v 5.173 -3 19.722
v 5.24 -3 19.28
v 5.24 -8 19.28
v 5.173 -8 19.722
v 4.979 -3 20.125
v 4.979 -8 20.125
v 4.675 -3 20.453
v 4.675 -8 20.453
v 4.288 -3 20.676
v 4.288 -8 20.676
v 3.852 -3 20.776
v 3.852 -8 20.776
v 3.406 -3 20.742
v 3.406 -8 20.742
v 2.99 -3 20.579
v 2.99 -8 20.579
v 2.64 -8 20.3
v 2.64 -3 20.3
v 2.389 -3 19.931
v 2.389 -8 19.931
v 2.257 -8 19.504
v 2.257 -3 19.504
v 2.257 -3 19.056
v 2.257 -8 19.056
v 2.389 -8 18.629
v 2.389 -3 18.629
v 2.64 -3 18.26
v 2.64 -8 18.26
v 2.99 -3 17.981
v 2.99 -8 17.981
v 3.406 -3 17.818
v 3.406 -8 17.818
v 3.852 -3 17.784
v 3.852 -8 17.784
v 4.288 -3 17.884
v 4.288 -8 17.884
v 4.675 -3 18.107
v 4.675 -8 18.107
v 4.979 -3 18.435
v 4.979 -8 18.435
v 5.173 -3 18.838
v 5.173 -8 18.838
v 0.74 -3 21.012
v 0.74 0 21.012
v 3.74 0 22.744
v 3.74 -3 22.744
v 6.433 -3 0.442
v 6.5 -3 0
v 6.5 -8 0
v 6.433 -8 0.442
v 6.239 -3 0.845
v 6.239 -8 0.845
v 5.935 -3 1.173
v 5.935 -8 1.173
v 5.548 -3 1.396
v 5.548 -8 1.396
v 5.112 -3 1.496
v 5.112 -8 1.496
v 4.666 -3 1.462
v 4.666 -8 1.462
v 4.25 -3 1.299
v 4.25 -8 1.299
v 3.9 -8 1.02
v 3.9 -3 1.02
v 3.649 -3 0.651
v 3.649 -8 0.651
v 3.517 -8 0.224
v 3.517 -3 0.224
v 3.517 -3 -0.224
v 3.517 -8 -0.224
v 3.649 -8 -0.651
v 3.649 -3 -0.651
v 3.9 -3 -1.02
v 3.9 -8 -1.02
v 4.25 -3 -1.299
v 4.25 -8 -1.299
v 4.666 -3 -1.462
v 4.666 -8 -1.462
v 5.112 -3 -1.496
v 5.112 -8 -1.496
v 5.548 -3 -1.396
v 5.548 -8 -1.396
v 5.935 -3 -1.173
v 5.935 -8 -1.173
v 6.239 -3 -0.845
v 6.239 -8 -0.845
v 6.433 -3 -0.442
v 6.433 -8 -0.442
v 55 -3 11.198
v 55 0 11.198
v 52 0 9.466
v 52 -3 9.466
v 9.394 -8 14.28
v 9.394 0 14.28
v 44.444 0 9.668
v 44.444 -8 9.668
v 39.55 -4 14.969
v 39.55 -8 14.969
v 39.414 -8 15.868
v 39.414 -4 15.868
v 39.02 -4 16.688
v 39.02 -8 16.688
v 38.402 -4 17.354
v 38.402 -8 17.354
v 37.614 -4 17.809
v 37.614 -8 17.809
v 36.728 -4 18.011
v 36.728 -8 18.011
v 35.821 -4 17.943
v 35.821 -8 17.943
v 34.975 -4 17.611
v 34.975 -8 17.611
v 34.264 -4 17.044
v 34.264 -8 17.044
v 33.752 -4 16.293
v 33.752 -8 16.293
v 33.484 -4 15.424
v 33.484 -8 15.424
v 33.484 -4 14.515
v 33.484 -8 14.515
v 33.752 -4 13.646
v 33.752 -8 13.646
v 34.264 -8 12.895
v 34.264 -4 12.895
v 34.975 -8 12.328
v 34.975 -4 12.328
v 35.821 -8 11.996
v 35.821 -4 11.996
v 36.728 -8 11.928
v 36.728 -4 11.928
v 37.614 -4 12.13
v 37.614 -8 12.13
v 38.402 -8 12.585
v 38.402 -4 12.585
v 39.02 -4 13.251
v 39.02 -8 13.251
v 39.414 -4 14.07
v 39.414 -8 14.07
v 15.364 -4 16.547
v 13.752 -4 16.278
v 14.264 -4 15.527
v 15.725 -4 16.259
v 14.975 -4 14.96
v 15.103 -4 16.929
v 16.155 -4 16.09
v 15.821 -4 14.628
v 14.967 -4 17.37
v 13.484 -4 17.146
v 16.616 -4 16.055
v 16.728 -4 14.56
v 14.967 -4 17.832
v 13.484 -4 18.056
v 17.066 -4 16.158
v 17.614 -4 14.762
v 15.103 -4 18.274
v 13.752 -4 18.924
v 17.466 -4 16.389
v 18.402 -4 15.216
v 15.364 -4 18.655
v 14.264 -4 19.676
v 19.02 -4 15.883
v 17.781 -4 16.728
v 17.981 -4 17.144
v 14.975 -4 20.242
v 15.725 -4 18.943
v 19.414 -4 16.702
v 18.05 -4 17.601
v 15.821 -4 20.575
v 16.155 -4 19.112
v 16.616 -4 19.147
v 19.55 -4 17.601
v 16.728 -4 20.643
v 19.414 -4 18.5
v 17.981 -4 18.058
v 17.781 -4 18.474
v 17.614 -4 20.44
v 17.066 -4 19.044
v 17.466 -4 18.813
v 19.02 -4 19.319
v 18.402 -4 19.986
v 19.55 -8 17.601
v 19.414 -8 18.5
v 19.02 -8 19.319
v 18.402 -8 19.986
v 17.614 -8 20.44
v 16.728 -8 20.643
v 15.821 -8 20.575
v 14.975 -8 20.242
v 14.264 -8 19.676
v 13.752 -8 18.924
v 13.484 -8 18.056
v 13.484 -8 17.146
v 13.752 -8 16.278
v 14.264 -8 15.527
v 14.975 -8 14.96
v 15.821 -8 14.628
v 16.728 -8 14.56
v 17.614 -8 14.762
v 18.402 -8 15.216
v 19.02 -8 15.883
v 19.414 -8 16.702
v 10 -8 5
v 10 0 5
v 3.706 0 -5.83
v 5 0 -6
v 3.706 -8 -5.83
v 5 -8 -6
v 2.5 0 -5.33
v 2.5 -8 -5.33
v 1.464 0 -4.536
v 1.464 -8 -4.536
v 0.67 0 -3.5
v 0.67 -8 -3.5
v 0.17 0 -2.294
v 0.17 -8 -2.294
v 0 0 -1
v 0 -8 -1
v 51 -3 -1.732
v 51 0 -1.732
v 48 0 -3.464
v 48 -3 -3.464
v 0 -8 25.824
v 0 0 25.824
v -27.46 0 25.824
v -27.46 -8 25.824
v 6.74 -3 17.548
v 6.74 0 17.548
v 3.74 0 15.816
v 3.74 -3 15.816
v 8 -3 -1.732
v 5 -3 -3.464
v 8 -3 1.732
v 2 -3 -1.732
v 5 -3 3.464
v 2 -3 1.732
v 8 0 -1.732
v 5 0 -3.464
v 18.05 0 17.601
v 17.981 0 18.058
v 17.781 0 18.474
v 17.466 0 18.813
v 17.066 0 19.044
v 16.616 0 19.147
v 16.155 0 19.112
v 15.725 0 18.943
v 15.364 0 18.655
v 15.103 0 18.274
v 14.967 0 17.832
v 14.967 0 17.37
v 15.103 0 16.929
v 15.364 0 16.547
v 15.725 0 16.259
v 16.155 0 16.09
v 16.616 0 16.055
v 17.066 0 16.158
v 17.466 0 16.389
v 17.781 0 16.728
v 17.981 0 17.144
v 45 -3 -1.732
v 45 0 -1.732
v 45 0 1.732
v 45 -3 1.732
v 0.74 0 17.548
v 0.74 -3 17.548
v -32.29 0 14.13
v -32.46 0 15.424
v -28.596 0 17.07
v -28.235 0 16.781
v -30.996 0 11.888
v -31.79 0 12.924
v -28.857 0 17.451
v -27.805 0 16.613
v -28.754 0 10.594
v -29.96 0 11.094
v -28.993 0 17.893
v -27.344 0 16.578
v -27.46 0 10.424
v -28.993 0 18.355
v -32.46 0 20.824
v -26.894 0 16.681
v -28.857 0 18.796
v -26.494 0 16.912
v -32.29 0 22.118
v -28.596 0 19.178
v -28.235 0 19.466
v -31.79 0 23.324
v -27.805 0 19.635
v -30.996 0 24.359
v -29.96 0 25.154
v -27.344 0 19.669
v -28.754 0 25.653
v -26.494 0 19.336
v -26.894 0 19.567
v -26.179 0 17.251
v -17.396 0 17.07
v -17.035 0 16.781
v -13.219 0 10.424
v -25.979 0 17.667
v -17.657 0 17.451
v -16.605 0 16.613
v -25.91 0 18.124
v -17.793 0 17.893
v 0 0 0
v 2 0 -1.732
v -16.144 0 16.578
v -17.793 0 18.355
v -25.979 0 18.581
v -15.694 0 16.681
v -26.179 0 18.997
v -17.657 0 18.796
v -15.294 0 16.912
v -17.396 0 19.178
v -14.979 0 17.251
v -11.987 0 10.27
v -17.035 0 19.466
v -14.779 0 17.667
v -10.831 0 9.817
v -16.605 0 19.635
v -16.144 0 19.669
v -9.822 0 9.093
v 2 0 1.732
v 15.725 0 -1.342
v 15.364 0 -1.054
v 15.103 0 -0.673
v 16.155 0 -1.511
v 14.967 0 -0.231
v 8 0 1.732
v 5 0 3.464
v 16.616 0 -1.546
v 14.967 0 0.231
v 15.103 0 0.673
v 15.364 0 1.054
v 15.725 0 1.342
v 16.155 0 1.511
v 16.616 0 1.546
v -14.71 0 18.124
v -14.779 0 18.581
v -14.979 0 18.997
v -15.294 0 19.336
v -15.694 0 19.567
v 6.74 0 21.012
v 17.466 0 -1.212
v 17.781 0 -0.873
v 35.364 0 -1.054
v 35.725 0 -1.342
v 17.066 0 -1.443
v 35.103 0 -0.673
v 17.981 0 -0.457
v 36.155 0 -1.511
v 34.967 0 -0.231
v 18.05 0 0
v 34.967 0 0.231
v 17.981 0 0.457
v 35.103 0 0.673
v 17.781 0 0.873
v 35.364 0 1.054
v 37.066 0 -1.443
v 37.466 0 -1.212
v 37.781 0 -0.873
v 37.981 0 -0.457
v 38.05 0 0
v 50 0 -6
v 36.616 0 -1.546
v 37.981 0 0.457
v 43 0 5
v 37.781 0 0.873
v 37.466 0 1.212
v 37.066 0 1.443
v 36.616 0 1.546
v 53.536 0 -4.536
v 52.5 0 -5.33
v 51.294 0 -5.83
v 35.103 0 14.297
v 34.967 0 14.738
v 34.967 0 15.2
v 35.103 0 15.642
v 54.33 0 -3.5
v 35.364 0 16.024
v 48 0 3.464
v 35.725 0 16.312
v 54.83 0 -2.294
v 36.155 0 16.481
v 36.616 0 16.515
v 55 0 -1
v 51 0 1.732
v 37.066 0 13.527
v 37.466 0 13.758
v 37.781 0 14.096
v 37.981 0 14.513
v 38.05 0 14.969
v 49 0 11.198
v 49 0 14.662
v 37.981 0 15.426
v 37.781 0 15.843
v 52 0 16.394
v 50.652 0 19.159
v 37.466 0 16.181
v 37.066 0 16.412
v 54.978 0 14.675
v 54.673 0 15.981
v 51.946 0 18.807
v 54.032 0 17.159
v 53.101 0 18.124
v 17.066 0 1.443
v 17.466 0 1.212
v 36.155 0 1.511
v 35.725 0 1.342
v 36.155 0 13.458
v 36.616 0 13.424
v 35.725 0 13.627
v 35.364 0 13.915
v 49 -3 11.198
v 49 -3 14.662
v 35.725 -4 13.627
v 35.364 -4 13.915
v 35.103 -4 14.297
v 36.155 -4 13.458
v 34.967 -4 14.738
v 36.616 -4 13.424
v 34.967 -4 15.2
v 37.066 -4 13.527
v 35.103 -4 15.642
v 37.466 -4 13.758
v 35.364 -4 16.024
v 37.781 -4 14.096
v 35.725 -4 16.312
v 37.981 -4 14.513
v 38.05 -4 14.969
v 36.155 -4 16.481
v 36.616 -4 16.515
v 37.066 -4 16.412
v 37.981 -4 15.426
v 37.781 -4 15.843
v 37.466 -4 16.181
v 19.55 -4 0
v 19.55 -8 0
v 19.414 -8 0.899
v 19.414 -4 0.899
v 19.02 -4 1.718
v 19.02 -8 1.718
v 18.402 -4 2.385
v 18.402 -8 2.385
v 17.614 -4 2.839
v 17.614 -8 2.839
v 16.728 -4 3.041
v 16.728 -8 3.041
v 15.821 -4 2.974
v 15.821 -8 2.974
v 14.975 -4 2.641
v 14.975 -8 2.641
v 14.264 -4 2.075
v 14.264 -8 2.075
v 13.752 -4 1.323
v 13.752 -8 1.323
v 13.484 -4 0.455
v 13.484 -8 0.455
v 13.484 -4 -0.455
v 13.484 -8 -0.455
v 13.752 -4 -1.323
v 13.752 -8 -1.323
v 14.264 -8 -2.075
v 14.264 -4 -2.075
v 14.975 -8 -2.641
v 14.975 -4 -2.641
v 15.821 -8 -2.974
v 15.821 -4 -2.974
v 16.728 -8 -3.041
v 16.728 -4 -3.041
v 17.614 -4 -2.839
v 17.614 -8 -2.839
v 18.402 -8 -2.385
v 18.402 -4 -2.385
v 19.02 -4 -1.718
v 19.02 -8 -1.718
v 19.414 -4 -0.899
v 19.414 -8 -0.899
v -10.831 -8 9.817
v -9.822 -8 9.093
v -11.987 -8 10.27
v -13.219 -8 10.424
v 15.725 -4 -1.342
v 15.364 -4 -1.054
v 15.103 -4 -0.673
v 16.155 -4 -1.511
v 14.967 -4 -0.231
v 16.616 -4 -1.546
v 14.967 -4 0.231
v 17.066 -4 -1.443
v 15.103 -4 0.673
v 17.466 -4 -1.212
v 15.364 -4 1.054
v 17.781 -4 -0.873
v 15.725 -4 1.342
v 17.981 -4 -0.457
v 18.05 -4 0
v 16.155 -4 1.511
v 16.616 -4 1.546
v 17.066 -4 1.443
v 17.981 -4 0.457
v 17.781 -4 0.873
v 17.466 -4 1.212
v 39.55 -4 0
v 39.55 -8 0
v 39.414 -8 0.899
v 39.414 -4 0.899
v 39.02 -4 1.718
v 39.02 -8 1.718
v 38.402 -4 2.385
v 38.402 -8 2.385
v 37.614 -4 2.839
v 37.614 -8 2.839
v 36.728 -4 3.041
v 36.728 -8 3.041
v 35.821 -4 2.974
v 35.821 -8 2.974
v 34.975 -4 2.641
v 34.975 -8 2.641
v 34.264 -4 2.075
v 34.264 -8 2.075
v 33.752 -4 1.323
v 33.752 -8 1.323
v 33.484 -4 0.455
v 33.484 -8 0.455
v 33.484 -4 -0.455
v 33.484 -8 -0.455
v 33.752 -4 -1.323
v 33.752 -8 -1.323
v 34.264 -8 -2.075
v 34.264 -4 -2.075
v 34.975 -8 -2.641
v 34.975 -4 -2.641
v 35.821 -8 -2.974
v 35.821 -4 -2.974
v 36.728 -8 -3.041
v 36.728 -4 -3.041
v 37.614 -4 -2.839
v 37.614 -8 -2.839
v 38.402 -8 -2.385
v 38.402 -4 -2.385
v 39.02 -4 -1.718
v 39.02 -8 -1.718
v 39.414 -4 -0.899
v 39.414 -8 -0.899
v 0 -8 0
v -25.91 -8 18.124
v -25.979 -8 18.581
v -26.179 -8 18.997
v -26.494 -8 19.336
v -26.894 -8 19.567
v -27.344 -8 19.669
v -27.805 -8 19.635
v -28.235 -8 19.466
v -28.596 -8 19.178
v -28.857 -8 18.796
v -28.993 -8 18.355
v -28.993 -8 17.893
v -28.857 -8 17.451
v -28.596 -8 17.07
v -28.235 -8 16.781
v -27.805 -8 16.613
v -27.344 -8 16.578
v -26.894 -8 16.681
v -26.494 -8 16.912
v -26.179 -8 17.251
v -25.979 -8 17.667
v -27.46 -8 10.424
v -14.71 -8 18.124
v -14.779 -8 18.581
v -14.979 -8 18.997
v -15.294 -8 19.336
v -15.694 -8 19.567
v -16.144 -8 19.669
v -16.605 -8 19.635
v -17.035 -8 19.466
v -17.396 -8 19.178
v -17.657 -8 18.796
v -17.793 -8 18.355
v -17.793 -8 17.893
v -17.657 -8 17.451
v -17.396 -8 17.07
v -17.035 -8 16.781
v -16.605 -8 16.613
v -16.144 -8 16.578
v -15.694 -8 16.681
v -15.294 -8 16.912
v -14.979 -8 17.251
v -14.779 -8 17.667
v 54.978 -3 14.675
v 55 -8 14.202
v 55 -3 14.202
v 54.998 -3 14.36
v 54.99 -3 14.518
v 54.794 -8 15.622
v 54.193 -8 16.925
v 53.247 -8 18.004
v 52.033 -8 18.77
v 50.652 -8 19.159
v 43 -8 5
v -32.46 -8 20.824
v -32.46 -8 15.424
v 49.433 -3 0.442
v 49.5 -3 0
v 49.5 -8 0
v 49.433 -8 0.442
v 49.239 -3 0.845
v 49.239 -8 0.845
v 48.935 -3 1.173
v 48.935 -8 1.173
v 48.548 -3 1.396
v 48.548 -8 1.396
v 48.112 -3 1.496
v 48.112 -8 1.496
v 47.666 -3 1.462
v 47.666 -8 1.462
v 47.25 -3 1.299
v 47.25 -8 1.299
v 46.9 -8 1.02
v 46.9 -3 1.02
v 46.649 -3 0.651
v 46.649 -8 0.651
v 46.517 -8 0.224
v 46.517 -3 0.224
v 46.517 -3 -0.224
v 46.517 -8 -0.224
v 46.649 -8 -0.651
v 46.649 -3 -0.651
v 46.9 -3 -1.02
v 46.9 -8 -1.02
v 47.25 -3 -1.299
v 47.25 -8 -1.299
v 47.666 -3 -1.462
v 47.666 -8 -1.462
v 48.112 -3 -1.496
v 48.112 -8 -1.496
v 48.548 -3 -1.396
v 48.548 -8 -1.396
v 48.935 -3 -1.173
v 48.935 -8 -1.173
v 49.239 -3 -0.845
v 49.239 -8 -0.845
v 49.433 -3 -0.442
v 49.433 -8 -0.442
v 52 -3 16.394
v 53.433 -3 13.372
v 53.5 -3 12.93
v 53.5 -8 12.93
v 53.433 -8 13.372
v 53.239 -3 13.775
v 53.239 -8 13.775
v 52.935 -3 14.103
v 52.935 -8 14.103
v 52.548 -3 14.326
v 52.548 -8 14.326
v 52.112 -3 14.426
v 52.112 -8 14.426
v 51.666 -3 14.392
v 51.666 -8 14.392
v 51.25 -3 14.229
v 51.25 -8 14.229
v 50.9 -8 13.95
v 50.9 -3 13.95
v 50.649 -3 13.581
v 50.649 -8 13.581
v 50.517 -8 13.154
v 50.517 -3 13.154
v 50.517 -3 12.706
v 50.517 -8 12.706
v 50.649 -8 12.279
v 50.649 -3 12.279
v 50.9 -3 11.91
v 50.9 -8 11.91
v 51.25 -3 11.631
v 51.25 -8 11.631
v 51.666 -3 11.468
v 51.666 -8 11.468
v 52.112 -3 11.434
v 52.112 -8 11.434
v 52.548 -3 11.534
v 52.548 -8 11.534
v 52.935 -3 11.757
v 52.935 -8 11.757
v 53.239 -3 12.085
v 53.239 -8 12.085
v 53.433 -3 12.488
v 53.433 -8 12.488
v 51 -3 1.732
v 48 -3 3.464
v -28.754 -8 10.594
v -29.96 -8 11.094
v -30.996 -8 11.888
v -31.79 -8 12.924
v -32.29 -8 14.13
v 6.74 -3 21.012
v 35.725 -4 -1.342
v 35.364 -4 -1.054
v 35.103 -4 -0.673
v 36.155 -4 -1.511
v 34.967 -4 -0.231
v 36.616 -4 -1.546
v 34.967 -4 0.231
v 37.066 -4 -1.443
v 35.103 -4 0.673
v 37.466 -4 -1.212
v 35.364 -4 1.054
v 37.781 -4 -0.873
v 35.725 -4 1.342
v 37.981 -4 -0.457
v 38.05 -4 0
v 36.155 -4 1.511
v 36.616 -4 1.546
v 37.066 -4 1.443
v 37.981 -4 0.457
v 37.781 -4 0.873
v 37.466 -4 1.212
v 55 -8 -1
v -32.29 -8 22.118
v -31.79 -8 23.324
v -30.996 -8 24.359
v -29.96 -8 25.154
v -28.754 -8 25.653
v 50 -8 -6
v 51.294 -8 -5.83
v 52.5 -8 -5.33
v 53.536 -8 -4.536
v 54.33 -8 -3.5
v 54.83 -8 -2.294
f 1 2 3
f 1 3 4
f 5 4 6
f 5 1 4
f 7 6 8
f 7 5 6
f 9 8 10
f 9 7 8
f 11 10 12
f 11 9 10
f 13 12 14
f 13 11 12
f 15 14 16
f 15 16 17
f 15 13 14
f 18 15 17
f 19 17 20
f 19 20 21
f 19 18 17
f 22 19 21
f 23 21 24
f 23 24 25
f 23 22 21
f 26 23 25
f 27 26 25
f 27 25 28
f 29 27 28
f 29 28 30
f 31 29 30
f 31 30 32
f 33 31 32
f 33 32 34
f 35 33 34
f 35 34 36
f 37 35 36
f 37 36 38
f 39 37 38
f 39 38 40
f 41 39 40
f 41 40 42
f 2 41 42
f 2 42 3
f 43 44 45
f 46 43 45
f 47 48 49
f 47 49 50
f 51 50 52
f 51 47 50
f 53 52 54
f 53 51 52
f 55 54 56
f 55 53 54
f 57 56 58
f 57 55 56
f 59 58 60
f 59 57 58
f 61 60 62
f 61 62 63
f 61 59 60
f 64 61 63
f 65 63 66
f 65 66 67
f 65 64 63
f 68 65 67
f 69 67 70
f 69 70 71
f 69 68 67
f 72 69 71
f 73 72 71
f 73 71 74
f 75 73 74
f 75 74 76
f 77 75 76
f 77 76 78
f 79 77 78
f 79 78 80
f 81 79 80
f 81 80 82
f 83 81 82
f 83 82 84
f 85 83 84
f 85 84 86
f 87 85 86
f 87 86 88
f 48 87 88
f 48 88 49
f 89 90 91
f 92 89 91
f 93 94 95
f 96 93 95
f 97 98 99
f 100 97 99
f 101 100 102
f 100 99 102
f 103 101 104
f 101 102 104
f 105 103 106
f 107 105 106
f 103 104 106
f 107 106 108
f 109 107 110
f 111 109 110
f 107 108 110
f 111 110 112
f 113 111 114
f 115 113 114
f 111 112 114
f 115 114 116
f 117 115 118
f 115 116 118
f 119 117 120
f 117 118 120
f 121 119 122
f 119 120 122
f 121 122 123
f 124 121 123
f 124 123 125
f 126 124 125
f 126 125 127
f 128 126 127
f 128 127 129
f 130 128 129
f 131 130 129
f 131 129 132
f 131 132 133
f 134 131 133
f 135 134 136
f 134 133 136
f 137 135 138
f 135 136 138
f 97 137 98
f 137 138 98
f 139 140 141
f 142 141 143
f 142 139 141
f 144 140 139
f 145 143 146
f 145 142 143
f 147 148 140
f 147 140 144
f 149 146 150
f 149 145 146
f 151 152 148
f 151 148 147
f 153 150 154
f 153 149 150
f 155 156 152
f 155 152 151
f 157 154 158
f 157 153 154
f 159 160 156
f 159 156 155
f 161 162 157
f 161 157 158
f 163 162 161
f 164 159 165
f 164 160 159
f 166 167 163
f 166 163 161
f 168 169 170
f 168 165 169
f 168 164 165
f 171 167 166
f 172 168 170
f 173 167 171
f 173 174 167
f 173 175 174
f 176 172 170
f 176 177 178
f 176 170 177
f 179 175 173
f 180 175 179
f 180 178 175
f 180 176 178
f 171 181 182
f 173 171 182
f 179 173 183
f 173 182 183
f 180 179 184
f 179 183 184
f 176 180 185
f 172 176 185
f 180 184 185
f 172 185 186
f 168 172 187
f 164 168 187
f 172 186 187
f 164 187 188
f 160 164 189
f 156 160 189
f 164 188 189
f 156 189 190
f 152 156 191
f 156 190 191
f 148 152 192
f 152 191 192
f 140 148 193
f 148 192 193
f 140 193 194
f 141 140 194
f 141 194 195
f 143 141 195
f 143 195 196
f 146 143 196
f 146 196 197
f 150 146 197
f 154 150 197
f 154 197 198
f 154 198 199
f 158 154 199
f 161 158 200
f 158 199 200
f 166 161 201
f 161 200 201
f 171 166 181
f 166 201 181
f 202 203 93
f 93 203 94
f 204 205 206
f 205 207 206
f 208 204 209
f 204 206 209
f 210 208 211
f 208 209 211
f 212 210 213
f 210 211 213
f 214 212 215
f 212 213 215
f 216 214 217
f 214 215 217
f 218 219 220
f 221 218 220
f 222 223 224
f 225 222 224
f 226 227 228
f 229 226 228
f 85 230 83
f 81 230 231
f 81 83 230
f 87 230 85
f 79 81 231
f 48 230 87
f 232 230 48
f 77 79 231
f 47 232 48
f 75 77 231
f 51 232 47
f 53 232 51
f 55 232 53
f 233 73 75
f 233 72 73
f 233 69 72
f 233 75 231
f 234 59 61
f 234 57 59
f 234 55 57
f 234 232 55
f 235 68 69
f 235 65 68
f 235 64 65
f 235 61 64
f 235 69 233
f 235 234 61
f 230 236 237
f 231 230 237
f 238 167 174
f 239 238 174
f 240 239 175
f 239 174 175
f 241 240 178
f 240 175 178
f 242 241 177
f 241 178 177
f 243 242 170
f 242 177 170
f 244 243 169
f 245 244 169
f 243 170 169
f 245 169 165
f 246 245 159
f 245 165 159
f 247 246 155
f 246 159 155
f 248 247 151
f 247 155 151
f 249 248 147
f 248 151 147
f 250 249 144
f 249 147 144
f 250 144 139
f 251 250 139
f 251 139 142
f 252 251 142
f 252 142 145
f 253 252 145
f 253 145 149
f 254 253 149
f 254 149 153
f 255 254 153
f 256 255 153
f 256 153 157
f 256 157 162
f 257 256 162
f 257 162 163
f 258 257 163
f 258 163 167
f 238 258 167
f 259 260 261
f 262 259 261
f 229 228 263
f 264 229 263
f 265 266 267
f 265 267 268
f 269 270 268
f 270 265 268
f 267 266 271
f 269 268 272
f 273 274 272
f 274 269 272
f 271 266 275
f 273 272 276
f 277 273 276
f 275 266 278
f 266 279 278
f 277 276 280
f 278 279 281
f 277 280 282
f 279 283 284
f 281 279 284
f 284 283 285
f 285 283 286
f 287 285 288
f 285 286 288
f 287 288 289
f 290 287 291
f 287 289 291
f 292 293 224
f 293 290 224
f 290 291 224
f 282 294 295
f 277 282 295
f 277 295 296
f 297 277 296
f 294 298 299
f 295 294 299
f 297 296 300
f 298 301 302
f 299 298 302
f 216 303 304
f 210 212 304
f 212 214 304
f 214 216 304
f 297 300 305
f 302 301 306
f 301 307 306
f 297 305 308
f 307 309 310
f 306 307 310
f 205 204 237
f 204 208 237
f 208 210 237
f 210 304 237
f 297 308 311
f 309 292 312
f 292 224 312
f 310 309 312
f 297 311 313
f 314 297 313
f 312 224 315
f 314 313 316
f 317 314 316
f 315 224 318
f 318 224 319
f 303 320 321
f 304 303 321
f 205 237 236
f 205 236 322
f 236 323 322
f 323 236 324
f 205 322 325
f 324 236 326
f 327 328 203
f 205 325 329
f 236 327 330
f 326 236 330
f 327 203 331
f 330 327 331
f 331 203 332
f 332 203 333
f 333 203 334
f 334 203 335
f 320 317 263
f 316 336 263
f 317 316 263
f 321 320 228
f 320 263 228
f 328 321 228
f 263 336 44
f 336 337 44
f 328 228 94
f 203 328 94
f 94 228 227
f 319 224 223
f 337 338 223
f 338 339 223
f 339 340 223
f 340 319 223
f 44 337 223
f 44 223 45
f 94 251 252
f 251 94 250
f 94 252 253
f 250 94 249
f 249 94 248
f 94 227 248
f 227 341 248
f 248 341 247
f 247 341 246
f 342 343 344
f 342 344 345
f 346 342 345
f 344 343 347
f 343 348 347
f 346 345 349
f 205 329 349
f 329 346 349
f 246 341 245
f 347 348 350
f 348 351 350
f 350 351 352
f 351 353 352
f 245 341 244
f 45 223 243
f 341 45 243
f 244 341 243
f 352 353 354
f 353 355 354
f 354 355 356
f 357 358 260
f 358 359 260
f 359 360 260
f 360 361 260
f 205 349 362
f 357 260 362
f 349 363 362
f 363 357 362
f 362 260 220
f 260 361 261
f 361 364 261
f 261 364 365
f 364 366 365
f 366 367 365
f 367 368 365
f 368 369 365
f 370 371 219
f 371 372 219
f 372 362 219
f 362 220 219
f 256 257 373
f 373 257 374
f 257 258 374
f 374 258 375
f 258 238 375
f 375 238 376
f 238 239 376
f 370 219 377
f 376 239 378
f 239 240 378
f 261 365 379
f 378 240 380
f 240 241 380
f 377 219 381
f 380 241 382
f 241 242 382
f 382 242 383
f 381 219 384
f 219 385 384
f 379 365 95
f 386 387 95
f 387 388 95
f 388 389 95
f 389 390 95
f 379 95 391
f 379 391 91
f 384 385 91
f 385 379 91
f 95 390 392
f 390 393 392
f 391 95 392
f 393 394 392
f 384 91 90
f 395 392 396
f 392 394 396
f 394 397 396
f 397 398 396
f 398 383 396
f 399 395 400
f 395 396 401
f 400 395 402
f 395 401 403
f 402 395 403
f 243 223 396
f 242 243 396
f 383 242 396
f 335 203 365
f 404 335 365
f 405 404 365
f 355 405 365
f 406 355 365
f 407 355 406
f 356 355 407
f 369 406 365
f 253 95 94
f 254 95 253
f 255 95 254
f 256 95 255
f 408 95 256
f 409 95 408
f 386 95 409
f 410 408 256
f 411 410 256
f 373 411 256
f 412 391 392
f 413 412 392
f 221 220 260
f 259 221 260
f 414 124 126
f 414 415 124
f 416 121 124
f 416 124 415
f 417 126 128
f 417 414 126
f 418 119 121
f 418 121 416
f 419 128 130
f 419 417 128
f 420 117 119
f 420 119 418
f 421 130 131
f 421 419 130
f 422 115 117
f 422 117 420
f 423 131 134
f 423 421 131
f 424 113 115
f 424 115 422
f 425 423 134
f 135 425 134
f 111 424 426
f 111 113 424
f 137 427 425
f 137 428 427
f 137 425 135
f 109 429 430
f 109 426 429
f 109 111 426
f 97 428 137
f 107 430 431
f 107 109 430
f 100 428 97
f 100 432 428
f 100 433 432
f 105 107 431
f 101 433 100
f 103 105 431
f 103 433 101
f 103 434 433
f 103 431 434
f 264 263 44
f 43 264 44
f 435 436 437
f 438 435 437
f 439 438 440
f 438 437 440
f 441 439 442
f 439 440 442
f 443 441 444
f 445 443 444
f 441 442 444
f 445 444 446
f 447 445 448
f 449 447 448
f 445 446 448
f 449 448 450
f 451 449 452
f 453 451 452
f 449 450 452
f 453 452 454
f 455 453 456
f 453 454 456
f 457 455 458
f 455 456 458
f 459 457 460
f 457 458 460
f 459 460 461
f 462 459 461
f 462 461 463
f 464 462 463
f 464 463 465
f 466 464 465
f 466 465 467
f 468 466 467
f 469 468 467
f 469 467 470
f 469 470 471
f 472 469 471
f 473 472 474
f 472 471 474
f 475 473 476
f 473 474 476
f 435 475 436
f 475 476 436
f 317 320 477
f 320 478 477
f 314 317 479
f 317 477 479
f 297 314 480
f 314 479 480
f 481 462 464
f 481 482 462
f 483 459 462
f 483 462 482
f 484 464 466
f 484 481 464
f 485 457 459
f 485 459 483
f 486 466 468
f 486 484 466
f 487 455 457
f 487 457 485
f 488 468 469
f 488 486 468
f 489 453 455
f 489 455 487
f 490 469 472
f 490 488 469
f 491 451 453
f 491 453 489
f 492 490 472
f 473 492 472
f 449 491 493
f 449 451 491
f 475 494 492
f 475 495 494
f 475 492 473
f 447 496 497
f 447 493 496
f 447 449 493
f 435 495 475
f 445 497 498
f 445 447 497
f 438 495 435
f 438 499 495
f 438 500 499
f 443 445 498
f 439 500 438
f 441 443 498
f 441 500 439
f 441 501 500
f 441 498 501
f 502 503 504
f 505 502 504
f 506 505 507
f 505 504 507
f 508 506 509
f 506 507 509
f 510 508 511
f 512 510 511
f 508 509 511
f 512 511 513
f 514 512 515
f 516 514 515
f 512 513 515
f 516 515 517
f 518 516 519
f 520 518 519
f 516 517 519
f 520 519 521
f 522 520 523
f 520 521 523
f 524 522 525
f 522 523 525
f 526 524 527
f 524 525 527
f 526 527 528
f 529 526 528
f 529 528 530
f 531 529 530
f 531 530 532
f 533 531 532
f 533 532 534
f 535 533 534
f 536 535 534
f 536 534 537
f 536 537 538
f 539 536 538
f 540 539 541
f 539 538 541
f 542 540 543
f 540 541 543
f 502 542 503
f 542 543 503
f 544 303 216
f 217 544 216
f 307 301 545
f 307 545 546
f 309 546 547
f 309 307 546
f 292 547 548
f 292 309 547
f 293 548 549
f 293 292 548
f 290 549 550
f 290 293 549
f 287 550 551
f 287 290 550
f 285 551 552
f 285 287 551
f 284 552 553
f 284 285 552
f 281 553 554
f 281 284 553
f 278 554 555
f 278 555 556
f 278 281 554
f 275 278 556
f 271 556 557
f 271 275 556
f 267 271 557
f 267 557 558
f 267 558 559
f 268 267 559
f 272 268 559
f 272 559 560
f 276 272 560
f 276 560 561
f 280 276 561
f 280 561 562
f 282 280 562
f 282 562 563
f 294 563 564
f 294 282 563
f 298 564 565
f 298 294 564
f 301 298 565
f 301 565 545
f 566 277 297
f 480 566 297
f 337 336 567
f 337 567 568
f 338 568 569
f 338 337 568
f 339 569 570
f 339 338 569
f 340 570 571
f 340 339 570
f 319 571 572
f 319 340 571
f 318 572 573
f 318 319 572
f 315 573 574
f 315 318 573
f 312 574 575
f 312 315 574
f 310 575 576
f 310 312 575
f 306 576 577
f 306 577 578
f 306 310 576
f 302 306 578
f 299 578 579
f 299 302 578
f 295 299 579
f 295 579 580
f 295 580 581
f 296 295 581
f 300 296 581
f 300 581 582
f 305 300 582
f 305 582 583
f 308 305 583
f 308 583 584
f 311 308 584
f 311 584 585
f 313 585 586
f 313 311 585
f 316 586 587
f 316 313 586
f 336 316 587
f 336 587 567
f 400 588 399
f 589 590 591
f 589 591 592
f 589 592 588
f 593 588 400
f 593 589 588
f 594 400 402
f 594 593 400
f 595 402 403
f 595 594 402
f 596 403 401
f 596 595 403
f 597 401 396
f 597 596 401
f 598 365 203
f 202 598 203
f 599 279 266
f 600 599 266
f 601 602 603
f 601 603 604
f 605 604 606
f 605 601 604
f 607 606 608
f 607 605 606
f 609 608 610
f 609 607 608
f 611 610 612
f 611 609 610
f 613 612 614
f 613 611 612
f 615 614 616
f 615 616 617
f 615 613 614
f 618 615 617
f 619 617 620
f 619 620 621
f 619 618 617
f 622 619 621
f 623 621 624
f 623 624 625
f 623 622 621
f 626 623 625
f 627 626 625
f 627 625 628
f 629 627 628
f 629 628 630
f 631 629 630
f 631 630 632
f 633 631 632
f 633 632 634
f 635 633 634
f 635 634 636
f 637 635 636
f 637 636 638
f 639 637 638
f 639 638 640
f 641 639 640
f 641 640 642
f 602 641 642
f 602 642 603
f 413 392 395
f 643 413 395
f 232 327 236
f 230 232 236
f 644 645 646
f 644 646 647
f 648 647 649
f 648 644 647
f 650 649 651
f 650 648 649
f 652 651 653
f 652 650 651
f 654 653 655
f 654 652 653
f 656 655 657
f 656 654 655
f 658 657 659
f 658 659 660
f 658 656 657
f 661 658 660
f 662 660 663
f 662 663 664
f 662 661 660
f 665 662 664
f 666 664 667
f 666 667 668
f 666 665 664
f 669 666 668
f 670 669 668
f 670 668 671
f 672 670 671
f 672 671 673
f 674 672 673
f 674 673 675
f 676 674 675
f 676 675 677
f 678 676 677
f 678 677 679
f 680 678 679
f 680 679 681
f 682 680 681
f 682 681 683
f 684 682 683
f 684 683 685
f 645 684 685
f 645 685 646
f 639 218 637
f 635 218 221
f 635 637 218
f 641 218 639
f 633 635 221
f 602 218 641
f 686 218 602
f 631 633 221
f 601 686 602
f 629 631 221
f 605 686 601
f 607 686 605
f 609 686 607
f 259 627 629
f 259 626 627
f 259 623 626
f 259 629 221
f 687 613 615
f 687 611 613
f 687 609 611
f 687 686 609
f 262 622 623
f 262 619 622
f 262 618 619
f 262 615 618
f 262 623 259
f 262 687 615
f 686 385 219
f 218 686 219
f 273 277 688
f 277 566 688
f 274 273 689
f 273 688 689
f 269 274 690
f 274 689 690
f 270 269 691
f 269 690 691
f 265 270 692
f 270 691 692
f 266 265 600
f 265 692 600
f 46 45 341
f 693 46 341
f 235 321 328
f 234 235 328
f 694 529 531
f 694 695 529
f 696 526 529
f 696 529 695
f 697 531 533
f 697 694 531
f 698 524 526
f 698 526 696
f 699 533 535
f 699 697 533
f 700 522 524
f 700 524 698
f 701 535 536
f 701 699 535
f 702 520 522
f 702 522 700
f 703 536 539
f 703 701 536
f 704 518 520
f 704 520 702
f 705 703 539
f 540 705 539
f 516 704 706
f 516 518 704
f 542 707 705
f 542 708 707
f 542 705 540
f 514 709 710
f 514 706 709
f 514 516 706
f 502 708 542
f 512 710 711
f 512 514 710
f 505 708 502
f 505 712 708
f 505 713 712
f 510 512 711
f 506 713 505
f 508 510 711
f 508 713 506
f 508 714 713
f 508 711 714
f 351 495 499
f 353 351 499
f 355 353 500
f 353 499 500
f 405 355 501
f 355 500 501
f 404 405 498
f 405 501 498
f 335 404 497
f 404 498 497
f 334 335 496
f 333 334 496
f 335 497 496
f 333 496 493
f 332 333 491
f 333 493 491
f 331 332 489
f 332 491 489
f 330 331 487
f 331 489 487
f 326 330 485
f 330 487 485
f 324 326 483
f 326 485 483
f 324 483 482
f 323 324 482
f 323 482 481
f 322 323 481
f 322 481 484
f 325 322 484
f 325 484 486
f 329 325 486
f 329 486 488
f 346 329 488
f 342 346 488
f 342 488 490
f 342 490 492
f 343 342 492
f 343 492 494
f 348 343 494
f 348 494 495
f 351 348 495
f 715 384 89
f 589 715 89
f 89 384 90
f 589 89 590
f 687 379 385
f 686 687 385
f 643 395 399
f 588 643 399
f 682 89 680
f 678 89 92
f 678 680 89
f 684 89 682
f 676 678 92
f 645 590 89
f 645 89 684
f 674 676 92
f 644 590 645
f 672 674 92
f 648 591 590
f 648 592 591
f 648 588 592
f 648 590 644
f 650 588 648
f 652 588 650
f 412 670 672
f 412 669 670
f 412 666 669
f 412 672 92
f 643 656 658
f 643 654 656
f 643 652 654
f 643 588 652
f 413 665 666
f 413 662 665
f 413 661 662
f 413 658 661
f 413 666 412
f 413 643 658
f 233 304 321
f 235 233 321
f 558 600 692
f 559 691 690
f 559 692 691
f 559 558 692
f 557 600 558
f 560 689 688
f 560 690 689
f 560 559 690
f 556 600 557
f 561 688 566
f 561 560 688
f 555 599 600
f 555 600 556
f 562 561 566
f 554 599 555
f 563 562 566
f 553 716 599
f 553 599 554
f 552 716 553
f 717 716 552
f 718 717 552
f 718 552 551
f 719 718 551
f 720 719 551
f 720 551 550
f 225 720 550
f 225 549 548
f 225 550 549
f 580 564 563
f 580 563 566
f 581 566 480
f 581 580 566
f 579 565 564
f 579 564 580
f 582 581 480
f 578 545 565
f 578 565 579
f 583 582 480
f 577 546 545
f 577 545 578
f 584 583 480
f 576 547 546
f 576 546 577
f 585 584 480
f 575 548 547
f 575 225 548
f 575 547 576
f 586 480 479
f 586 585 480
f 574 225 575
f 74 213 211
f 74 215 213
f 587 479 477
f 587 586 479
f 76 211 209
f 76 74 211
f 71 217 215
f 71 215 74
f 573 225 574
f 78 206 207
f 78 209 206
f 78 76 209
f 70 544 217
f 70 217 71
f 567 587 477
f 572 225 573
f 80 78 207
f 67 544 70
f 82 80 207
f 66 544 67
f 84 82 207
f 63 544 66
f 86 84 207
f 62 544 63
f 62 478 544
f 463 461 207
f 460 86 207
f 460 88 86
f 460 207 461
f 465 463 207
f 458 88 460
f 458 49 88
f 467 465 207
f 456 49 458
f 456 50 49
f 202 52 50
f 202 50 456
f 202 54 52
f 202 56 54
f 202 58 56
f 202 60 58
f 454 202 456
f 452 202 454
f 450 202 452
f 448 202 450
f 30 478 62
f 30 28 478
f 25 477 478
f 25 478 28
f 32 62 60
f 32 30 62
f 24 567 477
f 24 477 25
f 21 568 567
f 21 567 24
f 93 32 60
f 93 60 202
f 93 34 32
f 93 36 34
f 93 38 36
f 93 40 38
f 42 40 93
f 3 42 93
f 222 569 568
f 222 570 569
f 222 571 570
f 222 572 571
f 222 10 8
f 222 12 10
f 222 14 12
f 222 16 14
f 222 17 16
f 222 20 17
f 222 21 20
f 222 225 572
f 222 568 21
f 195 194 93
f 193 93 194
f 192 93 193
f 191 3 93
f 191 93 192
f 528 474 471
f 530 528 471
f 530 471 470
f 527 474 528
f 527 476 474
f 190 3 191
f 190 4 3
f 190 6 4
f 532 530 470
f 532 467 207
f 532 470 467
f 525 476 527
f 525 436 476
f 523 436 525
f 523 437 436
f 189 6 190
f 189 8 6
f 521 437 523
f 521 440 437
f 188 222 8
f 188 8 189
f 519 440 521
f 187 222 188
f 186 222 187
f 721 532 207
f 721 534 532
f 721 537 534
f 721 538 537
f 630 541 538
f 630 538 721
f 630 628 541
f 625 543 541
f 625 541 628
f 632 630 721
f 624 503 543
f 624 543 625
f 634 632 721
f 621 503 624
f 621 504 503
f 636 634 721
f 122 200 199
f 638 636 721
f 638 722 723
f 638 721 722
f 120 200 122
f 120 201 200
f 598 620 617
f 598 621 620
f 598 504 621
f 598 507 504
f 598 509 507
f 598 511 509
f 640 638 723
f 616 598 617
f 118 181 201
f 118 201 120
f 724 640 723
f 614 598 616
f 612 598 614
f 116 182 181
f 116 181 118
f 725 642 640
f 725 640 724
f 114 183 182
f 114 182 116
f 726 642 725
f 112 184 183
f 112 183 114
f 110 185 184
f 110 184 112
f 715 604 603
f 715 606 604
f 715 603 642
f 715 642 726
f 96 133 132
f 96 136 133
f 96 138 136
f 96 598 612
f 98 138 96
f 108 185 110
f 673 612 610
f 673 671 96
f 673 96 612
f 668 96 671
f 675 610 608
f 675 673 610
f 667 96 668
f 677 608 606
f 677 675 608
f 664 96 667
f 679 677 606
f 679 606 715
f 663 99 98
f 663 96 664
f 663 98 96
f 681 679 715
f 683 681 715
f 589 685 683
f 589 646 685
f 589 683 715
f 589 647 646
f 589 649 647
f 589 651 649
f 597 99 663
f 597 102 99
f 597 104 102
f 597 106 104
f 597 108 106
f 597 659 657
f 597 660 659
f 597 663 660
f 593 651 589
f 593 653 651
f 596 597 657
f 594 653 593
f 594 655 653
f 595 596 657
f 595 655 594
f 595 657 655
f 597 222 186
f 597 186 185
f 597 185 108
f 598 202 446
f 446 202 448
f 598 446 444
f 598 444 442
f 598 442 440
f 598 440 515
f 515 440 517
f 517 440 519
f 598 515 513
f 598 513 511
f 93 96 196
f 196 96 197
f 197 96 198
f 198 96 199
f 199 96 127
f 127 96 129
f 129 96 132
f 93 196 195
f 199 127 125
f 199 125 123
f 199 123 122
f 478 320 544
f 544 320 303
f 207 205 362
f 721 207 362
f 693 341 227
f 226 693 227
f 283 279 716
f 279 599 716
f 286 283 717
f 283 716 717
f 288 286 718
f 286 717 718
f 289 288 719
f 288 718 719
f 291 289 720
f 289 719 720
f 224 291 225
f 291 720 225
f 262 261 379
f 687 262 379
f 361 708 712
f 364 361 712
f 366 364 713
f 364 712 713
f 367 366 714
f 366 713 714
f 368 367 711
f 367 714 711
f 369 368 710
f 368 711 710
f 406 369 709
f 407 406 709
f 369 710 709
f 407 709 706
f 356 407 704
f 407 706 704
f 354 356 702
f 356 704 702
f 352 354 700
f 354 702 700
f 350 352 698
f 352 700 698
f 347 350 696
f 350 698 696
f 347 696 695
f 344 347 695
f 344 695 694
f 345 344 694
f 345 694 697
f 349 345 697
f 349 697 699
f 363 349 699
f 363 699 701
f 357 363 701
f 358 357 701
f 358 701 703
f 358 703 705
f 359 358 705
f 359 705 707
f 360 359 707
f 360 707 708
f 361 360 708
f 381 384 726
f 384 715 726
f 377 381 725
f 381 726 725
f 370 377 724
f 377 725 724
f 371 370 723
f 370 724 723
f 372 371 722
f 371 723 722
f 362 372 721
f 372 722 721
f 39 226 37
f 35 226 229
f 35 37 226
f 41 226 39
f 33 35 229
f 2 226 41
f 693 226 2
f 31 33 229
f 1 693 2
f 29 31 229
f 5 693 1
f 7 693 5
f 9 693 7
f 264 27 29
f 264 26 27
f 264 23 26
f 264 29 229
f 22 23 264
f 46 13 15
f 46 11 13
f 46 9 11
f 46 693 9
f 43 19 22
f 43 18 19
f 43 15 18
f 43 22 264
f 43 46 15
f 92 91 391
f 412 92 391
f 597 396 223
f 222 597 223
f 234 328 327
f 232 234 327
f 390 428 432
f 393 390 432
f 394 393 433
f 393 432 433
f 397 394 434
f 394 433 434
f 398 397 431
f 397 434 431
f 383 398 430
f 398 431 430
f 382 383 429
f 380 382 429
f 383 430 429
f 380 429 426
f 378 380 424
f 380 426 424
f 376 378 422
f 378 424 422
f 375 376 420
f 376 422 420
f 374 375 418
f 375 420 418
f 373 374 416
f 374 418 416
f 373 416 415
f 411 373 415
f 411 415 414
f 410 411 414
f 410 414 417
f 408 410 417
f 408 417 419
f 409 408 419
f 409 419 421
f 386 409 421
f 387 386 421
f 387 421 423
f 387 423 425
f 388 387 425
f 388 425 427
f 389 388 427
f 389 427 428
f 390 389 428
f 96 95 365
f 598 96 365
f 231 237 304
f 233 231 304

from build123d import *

# Parameters (mm, degrees)
F0_R     = 1.5
F0_R_2   = 1.55
F1_DEPTH = 8
F3_DEPTH = 3
F4_R     = 1.55
F5_DEPTH = 8.001
F6_R     = 3.05
F7_DEPTH = 4
F8_R     = 5


with BuildPart() as f1:
    # F0 (on Front) → F1 (new body)
    with BuildSketch(Plane.XZ):
        Polygon((55, -6), (55, 18.586979), (0, 25.823821), (-32.46, 25.823821), (-32.46, 18.123821), (-32.46, 10.423821), (-11.26, 10.423821), (0, 0), (0, -6), align=None)
        with Locations((5, 0)):
            Circle(F0_R, mode=Mode.SUBTRACT)
        with Locations((48, 0)):
            Circle(F0_R, mode=Mode.SUBTRACT)
        Polygon((10, 5), (9.393527, 14.28), (44.444109, 9.668081), (43, 5), align=None, mode=Mode.SUBTRACT)
        with Locations((-27.46, 18.123821)):
            Circle(F0_R_2, mode=Mode.SUBTRACT)
        with Locations((-16.26, 18.123821)):
            Circle(F0_R_2, mode=Mode.SUBTRACT)
        with Locations((3.74, 19.28)):
            Circle(F0_R, mode=Mode.SUBTRACT)
        with Locations((52, 12.93)):
            Circle(F0_R, mode=Mode.SUBTRACT)
    extrude(amount=F1_DEPTH)

    # F2 (on face) → F3 (cut)
    with BuildSketch(Plane(origin=(0, 0, 0), x_dir=(-1, 0, 0), z_dir=(0, 1, 0))):
        Polygon((-49, 11.197949), (-49, 14.662051), (-52, 16.394102), (-55, 14.662051), (-55, 11.197949), (-52, 9.465898), align=None)
        Polygon((-45, -1.732051), (-45, 1.732051), (-48, 3.464102), (-51, 1.732051), (-51, -1.732051), (-48, -3.464102), align=None)
        Polygon((-8, 1.732051), (-8, -1.732051), (-5, -3.464102), (-2, -1.732051), (-2, 1.732051), (-5, 3.464102), align=None)
        Polygon((-6.74, 21.012051), (-6.74, 17.547949), (-3.74, 15.815898), (-0.74, 17.547949), (-0.74, 21.012051), (-3.74, 22.744102), align=None)
    extrude(amount=-F3_DEPTH, mode=Mode.SUBTRACT)

    # F4 (on face) → F5 (cut, through all)
    with BuildSketch(Plane.XZ.offset(8)):
        with Locations((16.5, 0)):
            Circle(F4_R)
        with Locations((36.5, 0)):
            Circle(F4_R)
        with Locations((16.5, 17.601053)):
            Circle(F4_R)
        with Locations((36.5, 14.969474)):
            Circle(F4_R)
    extrude(amount=-F5_DEPTH, mode=Mode.SUBTRACT)

    # F6 (on face) → F7 (cut)
    with BuildSketch(Plane.XZ.offset(8)):
        with Locations((16.5, 0)):
            Circle(F6_R)
        with Locations((36.5, 0)):
            Circle(F6_R)
        with Locations((16.5, 17.601053)):
            Circle(F6_R)
        with Locations((36.5, 14.969474)):
            Circle(F6_R)
    extrude(amount=-F7_DEPTH, mode=Mode.SUBTRACT)

    # F8
    f8_edges = [f1.edges().sort_by_distance(p)[0] for p in [
        (-32.46, -4, 25.823821),
        (-32.46, -4, 10.423821),
        (-11.26, -4, 10.423821),
        (0, -4, -6),
        (55, -4, -6),
        (55, -4, 18.586979),
    ]]
    fillet(f8_edges, radius=F8_R)


solid = f1.part
